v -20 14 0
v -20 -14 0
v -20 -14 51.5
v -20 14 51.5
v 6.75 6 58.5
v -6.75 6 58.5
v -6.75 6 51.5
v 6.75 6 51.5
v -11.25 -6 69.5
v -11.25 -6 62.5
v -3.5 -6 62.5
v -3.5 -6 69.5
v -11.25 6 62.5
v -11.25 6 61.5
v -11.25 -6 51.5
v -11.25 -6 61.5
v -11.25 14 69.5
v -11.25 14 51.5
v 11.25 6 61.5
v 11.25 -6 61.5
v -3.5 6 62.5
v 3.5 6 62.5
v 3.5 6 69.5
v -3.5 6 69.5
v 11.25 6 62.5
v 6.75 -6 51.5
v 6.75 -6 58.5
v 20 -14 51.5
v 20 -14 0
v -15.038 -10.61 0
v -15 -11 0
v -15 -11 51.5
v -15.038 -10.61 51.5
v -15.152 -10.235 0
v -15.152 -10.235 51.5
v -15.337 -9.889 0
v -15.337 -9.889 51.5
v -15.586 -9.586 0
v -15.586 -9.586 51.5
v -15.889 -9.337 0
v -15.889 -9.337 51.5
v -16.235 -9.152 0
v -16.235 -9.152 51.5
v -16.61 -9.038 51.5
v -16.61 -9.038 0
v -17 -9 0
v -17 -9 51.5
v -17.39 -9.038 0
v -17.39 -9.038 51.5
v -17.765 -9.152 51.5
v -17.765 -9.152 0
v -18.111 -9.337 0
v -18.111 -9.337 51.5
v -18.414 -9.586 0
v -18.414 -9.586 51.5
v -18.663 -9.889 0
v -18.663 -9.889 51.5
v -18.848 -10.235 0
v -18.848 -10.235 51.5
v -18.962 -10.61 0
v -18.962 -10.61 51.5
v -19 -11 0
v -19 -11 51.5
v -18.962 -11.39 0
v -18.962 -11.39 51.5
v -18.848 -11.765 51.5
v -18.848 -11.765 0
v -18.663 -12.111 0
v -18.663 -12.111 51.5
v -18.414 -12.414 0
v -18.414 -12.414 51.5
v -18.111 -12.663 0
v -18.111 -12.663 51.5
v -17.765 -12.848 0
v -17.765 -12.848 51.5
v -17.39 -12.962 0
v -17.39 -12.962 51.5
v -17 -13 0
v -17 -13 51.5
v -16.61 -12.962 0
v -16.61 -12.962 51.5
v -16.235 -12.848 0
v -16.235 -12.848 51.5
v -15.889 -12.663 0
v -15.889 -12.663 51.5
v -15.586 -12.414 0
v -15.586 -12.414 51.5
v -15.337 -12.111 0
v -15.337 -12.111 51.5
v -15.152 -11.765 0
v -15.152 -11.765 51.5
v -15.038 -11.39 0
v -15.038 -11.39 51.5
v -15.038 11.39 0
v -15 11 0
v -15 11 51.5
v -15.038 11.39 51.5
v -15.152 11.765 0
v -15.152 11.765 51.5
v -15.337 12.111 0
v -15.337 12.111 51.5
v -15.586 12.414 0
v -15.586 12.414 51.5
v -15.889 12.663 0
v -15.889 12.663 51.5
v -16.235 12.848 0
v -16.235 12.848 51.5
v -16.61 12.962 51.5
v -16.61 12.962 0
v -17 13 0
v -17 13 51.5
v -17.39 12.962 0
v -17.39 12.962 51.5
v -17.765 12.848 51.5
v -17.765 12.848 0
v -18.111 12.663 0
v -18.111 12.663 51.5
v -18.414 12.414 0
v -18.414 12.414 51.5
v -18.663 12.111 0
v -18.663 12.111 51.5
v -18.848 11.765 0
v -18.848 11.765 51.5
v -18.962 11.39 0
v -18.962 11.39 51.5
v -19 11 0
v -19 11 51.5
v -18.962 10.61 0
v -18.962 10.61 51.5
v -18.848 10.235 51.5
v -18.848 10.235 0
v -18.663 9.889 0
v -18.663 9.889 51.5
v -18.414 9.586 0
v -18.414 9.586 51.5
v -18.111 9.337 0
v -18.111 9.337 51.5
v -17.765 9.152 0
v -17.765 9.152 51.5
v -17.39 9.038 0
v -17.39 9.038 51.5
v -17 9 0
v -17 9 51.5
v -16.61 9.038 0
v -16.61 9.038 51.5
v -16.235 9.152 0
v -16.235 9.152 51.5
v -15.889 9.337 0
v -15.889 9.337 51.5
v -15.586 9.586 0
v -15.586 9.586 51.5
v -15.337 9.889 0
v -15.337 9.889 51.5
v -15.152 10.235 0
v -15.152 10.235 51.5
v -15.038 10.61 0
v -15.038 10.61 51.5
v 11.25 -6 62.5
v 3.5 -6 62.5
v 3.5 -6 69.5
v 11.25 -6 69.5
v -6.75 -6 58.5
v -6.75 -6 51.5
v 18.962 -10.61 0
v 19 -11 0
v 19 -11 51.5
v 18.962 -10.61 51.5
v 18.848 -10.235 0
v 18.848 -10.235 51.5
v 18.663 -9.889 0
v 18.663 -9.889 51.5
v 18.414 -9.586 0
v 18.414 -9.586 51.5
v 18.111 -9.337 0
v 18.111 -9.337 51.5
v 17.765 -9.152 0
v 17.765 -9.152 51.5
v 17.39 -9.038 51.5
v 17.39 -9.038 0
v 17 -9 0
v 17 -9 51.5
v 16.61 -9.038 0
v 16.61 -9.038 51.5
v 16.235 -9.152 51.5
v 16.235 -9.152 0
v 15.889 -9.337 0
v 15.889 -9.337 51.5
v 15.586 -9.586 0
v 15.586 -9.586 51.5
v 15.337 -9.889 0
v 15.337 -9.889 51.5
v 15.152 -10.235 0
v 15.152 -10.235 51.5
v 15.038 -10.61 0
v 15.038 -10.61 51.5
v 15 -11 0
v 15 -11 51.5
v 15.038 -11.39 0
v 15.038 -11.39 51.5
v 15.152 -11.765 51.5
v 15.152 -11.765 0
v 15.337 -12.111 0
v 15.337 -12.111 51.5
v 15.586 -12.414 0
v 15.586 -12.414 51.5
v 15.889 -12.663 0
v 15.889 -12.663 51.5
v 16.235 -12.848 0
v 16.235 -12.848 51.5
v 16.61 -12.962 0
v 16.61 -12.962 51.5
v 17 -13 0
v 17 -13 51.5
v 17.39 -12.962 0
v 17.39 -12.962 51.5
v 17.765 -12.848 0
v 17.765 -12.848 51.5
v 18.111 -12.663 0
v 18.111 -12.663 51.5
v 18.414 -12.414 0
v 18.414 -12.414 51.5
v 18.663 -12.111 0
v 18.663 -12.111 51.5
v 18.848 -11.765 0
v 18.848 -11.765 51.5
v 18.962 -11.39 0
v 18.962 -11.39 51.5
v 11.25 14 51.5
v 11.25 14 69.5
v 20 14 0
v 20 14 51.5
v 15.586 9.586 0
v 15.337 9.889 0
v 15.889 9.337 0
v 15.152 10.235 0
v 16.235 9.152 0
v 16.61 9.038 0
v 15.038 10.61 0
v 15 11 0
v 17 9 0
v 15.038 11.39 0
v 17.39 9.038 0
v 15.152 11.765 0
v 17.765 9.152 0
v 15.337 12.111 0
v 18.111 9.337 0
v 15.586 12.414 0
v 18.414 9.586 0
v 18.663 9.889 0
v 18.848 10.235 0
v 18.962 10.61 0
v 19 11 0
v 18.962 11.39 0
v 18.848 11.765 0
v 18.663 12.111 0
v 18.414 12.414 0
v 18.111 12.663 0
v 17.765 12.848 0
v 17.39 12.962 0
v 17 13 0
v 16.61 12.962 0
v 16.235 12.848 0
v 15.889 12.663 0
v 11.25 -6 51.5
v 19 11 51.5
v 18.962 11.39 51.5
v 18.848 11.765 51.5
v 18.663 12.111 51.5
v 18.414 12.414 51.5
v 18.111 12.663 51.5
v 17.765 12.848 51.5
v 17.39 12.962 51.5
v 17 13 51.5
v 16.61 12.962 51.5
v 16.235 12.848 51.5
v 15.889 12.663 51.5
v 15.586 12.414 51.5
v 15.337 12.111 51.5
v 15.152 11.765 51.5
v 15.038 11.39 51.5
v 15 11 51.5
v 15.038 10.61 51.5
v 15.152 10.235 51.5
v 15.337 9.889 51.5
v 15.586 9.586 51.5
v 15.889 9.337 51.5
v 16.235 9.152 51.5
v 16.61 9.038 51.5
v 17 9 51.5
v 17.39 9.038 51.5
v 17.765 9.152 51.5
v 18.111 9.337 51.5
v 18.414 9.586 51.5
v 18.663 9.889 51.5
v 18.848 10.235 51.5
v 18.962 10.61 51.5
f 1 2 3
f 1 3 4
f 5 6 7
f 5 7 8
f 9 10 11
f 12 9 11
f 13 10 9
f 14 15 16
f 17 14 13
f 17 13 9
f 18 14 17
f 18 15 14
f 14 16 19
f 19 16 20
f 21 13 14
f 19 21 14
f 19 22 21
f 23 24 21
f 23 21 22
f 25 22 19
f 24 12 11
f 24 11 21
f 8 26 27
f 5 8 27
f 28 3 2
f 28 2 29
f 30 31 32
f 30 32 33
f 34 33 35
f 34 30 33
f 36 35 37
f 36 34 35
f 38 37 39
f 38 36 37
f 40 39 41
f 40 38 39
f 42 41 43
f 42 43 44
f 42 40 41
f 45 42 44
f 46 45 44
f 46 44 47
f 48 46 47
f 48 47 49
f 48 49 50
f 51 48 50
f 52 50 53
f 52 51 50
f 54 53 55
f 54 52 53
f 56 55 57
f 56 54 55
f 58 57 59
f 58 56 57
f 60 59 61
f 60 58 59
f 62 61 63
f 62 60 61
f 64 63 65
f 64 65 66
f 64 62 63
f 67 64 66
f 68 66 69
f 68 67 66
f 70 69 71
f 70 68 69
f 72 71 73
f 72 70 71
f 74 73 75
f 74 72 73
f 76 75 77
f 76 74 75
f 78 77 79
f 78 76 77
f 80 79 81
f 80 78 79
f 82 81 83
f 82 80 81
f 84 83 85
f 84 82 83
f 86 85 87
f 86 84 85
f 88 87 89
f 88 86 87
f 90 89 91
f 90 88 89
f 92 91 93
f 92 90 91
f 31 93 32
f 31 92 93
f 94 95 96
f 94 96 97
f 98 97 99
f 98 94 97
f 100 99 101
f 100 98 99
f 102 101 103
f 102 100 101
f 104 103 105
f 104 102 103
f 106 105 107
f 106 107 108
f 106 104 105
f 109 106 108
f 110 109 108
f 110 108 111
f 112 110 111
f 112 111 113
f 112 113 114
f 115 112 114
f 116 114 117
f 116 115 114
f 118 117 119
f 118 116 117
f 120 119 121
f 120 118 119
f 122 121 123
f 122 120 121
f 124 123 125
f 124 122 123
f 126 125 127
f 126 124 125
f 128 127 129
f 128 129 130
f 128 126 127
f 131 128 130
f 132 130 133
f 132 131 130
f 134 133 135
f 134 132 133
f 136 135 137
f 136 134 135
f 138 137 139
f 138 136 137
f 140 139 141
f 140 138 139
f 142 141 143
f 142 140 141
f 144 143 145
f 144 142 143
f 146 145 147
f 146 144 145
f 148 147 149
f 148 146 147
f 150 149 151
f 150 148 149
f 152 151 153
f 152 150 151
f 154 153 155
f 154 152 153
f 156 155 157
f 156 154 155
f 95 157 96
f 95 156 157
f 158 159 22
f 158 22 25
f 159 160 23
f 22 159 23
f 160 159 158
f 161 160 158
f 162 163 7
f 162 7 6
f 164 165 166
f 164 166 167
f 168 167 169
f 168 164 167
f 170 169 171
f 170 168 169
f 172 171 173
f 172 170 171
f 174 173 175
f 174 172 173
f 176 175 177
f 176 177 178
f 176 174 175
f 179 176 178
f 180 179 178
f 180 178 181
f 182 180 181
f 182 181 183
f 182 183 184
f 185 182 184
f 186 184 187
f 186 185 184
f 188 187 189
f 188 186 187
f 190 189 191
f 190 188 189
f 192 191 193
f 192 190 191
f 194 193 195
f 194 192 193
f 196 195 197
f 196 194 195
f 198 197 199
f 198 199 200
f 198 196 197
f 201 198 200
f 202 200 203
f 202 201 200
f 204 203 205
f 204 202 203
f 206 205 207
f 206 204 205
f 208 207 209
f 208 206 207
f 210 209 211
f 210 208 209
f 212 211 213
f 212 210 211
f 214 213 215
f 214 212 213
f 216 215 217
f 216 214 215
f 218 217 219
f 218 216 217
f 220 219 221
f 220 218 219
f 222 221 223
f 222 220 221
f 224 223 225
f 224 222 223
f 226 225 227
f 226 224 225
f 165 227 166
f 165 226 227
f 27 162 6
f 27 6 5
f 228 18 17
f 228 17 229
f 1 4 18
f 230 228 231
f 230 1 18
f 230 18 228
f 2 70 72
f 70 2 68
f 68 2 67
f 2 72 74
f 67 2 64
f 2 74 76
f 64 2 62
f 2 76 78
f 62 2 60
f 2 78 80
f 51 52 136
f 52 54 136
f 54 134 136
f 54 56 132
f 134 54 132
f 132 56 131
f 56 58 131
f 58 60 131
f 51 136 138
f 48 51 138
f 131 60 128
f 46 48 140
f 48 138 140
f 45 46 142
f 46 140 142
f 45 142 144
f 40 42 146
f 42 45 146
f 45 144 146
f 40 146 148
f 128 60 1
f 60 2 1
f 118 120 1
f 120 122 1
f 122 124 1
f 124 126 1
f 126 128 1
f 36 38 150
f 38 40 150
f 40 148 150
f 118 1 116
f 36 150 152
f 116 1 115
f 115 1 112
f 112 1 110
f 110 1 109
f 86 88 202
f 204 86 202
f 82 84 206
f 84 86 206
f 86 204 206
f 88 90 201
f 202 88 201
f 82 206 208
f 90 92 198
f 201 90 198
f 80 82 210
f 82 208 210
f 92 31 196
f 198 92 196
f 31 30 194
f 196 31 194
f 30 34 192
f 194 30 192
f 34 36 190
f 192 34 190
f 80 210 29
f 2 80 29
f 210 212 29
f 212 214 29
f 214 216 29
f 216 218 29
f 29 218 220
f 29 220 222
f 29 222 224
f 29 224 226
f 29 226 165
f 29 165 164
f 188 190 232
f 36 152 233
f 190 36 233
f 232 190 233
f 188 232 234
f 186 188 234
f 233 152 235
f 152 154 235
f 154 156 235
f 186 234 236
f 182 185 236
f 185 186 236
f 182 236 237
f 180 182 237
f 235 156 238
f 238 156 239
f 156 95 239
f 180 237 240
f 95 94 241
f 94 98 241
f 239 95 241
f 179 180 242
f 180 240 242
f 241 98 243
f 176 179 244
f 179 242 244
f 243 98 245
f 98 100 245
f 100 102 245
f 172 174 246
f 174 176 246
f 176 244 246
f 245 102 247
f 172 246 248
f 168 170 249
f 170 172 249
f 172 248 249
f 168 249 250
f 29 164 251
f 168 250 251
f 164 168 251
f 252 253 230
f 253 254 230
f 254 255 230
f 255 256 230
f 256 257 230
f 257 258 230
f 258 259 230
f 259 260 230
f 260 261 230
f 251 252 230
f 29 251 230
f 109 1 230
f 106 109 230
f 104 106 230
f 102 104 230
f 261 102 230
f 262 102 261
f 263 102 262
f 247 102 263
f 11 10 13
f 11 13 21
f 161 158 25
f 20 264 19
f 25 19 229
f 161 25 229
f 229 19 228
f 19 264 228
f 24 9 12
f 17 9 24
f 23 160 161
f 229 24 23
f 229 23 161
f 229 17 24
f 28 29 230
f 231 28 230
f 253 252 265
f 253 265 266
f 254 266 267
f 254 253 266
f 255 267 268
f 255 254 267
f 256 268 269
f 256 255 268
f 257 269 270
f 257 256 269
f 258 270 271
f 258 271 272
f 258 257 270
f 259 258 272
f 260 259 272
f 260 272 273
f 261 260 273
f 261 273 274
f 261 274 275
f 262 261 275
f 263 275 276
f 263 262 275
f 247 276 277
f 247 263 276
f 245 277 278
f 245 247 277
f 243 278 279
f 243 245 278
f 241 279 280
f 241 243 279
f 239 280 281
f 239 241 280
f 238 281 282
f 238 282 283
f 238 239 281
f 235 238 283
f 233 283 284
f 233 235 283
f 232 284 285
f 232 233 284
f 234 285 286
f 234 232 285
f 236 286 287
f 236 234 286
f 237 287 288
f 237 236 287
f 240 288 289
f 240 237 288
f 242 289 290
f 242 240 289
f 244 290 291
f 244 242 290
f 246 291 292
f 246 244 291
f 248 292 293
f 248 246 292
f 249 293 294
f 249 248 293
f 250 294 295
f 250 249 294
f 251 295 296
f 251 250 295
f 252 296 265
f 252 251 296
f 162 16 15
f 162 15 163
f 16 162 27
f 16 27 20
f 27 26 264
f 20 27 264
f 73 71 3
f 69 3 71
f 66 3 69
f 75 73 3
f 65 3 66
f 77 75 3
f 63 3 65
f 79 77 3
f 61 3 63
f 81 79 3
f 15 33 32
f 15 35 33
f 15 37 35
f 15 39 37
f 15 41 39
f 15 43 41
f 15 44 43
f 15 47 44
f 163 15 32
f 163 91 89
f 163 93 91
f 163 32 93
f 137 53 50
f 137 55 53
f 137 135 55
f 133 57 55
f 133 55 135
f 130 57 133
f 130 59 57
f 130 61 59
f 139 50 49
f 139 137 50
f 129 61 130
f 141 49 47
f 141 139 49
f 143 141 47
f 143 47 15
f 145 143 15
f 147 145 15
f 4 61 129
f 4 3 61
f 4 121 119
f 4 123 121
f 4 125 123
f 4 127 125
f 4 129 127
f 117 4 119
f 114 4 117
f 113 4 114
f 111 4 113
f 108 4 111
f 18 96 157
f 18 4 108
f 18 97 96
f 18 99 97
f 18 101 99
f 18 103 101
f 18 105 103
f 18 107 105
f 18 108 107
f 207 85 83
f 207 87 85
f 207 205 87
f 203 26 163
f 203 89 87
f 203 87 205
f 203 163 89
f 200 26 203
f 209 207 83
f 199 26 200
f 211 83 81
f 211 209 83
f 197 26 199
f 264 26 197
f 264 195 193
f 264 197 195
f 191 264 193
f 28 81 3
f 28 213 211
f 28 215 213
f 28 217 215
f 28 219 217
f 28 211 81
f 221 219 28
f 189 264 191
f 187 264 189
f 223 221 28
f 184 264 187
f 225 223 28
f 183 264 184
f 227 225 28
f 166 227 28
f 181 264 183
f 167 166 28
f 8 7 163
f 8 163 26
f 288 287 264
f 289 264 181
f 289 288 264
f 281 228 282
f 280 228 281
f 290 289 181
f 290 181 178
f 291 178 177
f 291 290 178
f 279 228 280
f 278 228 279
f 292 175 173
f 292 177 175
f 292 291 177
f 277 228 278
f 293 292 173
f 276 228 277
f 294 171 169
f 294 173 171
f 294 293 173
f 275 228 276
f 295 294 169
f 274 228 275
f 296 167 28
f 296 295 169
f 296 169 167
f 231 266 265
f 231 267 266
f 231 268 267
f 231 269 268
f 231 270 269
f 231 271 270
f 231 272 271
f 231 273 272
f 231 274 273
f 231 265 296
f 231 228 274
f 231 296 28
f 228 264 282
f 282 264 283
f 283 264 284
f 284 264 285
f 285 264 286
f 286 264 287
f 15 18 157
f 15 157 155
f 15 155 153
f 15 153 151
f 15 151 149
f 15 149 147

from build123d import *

# Parameters (mm, degrees)
SKETCH_1_W          = 40
SKETCH_1_H          = 28
SKETCH_1_R          = 2
EXTRUDE_1_DEPTH     = 51.5
SKETCH_2_W          = 22.5
SKETCH_2_H          = 20
EXTRUDE_2_DEPTH     = 18
SKETCH_3_W          = 13.5
SKETCH_3_H          = 7
CUT_EXTRUDE_1_DEPTH = 12
SKETCH_4_W          = 22.5
SKETCH_4_H          = 1
CUT_EXTRUDE_2_DEPTH = 12
SKETCH_5_W          = 7
SKETCH_5_H          = 12
CUT_EXTRUDE_3_DEPTH = 7


with BuildPart() as part:
    # 草图1 → 凸台-拉伸1 (new body)
    with BuildSketch(Plane.XY):
        Rectangle(SKETCH_1_W, SKETCH_1_H)
        with Locations((-17, 11)):
            Circle(SKETCH_1_R, mode=Mode.SUBTRACT)
        with Locations((17, 11)):
            Circle(SKETCH_1_R, mode=Mode.SUBTRACT)
        with Locations((-17, -11)):
            Circle(SKETCH_1_R, mode=Mode.SUBTRACT)
        with Locations((17, -11)):
            Circle(SKETCH_1_R, mode=Mode.SUBTRACT)
    extrude(amount=EXTRUDE_1_DEPTH)

    # 草图2 → 凸台-拉伸2 (add)
    with BuildSketch(Plane.XY.offset(51.5)):
        with Locations((0, 4)):
            Rectangle(SKETCH_2_W, SKETCH_2_H)
    extrude(amount=EXTRUDE_2_DEPTH)

    # 草图3 → 切除-拉伸1 (cut)
    with BuildSketch(Plane.XZ.offset(6)):
        with Locations((0, 55)):
            Rectangle(SKETCH_3_W, SKETCH_3_H)
    extrude(amount=-CUT_EXTRUDE_1_DEPTH, mode=Mode.SUBTRACT)

    # 草图4 → 切除-拉伸2 (cut)
    with BuildSketch(Plane.XZ.offset(6)):
        with Locations((0, 62)):
            Rectangle(SKETCH_4_W, SKETCH_4_H)
    extrude(amount=-CUT_EXTRUDE_2_DEPTH, mode=Mode.SUBTRACT)

    # 草图5 → 切除-拉伸3 (cut)
    with BuildSketch(Plane.XY.offset(69.5)):
        Rectangle(SKETCH_5_W, SKETCH_5_H)
    extrude(amount=-CUT_EXTRUDE_3_DEPTH, mode=Mode.SUBTRACT)


solid = part.part
